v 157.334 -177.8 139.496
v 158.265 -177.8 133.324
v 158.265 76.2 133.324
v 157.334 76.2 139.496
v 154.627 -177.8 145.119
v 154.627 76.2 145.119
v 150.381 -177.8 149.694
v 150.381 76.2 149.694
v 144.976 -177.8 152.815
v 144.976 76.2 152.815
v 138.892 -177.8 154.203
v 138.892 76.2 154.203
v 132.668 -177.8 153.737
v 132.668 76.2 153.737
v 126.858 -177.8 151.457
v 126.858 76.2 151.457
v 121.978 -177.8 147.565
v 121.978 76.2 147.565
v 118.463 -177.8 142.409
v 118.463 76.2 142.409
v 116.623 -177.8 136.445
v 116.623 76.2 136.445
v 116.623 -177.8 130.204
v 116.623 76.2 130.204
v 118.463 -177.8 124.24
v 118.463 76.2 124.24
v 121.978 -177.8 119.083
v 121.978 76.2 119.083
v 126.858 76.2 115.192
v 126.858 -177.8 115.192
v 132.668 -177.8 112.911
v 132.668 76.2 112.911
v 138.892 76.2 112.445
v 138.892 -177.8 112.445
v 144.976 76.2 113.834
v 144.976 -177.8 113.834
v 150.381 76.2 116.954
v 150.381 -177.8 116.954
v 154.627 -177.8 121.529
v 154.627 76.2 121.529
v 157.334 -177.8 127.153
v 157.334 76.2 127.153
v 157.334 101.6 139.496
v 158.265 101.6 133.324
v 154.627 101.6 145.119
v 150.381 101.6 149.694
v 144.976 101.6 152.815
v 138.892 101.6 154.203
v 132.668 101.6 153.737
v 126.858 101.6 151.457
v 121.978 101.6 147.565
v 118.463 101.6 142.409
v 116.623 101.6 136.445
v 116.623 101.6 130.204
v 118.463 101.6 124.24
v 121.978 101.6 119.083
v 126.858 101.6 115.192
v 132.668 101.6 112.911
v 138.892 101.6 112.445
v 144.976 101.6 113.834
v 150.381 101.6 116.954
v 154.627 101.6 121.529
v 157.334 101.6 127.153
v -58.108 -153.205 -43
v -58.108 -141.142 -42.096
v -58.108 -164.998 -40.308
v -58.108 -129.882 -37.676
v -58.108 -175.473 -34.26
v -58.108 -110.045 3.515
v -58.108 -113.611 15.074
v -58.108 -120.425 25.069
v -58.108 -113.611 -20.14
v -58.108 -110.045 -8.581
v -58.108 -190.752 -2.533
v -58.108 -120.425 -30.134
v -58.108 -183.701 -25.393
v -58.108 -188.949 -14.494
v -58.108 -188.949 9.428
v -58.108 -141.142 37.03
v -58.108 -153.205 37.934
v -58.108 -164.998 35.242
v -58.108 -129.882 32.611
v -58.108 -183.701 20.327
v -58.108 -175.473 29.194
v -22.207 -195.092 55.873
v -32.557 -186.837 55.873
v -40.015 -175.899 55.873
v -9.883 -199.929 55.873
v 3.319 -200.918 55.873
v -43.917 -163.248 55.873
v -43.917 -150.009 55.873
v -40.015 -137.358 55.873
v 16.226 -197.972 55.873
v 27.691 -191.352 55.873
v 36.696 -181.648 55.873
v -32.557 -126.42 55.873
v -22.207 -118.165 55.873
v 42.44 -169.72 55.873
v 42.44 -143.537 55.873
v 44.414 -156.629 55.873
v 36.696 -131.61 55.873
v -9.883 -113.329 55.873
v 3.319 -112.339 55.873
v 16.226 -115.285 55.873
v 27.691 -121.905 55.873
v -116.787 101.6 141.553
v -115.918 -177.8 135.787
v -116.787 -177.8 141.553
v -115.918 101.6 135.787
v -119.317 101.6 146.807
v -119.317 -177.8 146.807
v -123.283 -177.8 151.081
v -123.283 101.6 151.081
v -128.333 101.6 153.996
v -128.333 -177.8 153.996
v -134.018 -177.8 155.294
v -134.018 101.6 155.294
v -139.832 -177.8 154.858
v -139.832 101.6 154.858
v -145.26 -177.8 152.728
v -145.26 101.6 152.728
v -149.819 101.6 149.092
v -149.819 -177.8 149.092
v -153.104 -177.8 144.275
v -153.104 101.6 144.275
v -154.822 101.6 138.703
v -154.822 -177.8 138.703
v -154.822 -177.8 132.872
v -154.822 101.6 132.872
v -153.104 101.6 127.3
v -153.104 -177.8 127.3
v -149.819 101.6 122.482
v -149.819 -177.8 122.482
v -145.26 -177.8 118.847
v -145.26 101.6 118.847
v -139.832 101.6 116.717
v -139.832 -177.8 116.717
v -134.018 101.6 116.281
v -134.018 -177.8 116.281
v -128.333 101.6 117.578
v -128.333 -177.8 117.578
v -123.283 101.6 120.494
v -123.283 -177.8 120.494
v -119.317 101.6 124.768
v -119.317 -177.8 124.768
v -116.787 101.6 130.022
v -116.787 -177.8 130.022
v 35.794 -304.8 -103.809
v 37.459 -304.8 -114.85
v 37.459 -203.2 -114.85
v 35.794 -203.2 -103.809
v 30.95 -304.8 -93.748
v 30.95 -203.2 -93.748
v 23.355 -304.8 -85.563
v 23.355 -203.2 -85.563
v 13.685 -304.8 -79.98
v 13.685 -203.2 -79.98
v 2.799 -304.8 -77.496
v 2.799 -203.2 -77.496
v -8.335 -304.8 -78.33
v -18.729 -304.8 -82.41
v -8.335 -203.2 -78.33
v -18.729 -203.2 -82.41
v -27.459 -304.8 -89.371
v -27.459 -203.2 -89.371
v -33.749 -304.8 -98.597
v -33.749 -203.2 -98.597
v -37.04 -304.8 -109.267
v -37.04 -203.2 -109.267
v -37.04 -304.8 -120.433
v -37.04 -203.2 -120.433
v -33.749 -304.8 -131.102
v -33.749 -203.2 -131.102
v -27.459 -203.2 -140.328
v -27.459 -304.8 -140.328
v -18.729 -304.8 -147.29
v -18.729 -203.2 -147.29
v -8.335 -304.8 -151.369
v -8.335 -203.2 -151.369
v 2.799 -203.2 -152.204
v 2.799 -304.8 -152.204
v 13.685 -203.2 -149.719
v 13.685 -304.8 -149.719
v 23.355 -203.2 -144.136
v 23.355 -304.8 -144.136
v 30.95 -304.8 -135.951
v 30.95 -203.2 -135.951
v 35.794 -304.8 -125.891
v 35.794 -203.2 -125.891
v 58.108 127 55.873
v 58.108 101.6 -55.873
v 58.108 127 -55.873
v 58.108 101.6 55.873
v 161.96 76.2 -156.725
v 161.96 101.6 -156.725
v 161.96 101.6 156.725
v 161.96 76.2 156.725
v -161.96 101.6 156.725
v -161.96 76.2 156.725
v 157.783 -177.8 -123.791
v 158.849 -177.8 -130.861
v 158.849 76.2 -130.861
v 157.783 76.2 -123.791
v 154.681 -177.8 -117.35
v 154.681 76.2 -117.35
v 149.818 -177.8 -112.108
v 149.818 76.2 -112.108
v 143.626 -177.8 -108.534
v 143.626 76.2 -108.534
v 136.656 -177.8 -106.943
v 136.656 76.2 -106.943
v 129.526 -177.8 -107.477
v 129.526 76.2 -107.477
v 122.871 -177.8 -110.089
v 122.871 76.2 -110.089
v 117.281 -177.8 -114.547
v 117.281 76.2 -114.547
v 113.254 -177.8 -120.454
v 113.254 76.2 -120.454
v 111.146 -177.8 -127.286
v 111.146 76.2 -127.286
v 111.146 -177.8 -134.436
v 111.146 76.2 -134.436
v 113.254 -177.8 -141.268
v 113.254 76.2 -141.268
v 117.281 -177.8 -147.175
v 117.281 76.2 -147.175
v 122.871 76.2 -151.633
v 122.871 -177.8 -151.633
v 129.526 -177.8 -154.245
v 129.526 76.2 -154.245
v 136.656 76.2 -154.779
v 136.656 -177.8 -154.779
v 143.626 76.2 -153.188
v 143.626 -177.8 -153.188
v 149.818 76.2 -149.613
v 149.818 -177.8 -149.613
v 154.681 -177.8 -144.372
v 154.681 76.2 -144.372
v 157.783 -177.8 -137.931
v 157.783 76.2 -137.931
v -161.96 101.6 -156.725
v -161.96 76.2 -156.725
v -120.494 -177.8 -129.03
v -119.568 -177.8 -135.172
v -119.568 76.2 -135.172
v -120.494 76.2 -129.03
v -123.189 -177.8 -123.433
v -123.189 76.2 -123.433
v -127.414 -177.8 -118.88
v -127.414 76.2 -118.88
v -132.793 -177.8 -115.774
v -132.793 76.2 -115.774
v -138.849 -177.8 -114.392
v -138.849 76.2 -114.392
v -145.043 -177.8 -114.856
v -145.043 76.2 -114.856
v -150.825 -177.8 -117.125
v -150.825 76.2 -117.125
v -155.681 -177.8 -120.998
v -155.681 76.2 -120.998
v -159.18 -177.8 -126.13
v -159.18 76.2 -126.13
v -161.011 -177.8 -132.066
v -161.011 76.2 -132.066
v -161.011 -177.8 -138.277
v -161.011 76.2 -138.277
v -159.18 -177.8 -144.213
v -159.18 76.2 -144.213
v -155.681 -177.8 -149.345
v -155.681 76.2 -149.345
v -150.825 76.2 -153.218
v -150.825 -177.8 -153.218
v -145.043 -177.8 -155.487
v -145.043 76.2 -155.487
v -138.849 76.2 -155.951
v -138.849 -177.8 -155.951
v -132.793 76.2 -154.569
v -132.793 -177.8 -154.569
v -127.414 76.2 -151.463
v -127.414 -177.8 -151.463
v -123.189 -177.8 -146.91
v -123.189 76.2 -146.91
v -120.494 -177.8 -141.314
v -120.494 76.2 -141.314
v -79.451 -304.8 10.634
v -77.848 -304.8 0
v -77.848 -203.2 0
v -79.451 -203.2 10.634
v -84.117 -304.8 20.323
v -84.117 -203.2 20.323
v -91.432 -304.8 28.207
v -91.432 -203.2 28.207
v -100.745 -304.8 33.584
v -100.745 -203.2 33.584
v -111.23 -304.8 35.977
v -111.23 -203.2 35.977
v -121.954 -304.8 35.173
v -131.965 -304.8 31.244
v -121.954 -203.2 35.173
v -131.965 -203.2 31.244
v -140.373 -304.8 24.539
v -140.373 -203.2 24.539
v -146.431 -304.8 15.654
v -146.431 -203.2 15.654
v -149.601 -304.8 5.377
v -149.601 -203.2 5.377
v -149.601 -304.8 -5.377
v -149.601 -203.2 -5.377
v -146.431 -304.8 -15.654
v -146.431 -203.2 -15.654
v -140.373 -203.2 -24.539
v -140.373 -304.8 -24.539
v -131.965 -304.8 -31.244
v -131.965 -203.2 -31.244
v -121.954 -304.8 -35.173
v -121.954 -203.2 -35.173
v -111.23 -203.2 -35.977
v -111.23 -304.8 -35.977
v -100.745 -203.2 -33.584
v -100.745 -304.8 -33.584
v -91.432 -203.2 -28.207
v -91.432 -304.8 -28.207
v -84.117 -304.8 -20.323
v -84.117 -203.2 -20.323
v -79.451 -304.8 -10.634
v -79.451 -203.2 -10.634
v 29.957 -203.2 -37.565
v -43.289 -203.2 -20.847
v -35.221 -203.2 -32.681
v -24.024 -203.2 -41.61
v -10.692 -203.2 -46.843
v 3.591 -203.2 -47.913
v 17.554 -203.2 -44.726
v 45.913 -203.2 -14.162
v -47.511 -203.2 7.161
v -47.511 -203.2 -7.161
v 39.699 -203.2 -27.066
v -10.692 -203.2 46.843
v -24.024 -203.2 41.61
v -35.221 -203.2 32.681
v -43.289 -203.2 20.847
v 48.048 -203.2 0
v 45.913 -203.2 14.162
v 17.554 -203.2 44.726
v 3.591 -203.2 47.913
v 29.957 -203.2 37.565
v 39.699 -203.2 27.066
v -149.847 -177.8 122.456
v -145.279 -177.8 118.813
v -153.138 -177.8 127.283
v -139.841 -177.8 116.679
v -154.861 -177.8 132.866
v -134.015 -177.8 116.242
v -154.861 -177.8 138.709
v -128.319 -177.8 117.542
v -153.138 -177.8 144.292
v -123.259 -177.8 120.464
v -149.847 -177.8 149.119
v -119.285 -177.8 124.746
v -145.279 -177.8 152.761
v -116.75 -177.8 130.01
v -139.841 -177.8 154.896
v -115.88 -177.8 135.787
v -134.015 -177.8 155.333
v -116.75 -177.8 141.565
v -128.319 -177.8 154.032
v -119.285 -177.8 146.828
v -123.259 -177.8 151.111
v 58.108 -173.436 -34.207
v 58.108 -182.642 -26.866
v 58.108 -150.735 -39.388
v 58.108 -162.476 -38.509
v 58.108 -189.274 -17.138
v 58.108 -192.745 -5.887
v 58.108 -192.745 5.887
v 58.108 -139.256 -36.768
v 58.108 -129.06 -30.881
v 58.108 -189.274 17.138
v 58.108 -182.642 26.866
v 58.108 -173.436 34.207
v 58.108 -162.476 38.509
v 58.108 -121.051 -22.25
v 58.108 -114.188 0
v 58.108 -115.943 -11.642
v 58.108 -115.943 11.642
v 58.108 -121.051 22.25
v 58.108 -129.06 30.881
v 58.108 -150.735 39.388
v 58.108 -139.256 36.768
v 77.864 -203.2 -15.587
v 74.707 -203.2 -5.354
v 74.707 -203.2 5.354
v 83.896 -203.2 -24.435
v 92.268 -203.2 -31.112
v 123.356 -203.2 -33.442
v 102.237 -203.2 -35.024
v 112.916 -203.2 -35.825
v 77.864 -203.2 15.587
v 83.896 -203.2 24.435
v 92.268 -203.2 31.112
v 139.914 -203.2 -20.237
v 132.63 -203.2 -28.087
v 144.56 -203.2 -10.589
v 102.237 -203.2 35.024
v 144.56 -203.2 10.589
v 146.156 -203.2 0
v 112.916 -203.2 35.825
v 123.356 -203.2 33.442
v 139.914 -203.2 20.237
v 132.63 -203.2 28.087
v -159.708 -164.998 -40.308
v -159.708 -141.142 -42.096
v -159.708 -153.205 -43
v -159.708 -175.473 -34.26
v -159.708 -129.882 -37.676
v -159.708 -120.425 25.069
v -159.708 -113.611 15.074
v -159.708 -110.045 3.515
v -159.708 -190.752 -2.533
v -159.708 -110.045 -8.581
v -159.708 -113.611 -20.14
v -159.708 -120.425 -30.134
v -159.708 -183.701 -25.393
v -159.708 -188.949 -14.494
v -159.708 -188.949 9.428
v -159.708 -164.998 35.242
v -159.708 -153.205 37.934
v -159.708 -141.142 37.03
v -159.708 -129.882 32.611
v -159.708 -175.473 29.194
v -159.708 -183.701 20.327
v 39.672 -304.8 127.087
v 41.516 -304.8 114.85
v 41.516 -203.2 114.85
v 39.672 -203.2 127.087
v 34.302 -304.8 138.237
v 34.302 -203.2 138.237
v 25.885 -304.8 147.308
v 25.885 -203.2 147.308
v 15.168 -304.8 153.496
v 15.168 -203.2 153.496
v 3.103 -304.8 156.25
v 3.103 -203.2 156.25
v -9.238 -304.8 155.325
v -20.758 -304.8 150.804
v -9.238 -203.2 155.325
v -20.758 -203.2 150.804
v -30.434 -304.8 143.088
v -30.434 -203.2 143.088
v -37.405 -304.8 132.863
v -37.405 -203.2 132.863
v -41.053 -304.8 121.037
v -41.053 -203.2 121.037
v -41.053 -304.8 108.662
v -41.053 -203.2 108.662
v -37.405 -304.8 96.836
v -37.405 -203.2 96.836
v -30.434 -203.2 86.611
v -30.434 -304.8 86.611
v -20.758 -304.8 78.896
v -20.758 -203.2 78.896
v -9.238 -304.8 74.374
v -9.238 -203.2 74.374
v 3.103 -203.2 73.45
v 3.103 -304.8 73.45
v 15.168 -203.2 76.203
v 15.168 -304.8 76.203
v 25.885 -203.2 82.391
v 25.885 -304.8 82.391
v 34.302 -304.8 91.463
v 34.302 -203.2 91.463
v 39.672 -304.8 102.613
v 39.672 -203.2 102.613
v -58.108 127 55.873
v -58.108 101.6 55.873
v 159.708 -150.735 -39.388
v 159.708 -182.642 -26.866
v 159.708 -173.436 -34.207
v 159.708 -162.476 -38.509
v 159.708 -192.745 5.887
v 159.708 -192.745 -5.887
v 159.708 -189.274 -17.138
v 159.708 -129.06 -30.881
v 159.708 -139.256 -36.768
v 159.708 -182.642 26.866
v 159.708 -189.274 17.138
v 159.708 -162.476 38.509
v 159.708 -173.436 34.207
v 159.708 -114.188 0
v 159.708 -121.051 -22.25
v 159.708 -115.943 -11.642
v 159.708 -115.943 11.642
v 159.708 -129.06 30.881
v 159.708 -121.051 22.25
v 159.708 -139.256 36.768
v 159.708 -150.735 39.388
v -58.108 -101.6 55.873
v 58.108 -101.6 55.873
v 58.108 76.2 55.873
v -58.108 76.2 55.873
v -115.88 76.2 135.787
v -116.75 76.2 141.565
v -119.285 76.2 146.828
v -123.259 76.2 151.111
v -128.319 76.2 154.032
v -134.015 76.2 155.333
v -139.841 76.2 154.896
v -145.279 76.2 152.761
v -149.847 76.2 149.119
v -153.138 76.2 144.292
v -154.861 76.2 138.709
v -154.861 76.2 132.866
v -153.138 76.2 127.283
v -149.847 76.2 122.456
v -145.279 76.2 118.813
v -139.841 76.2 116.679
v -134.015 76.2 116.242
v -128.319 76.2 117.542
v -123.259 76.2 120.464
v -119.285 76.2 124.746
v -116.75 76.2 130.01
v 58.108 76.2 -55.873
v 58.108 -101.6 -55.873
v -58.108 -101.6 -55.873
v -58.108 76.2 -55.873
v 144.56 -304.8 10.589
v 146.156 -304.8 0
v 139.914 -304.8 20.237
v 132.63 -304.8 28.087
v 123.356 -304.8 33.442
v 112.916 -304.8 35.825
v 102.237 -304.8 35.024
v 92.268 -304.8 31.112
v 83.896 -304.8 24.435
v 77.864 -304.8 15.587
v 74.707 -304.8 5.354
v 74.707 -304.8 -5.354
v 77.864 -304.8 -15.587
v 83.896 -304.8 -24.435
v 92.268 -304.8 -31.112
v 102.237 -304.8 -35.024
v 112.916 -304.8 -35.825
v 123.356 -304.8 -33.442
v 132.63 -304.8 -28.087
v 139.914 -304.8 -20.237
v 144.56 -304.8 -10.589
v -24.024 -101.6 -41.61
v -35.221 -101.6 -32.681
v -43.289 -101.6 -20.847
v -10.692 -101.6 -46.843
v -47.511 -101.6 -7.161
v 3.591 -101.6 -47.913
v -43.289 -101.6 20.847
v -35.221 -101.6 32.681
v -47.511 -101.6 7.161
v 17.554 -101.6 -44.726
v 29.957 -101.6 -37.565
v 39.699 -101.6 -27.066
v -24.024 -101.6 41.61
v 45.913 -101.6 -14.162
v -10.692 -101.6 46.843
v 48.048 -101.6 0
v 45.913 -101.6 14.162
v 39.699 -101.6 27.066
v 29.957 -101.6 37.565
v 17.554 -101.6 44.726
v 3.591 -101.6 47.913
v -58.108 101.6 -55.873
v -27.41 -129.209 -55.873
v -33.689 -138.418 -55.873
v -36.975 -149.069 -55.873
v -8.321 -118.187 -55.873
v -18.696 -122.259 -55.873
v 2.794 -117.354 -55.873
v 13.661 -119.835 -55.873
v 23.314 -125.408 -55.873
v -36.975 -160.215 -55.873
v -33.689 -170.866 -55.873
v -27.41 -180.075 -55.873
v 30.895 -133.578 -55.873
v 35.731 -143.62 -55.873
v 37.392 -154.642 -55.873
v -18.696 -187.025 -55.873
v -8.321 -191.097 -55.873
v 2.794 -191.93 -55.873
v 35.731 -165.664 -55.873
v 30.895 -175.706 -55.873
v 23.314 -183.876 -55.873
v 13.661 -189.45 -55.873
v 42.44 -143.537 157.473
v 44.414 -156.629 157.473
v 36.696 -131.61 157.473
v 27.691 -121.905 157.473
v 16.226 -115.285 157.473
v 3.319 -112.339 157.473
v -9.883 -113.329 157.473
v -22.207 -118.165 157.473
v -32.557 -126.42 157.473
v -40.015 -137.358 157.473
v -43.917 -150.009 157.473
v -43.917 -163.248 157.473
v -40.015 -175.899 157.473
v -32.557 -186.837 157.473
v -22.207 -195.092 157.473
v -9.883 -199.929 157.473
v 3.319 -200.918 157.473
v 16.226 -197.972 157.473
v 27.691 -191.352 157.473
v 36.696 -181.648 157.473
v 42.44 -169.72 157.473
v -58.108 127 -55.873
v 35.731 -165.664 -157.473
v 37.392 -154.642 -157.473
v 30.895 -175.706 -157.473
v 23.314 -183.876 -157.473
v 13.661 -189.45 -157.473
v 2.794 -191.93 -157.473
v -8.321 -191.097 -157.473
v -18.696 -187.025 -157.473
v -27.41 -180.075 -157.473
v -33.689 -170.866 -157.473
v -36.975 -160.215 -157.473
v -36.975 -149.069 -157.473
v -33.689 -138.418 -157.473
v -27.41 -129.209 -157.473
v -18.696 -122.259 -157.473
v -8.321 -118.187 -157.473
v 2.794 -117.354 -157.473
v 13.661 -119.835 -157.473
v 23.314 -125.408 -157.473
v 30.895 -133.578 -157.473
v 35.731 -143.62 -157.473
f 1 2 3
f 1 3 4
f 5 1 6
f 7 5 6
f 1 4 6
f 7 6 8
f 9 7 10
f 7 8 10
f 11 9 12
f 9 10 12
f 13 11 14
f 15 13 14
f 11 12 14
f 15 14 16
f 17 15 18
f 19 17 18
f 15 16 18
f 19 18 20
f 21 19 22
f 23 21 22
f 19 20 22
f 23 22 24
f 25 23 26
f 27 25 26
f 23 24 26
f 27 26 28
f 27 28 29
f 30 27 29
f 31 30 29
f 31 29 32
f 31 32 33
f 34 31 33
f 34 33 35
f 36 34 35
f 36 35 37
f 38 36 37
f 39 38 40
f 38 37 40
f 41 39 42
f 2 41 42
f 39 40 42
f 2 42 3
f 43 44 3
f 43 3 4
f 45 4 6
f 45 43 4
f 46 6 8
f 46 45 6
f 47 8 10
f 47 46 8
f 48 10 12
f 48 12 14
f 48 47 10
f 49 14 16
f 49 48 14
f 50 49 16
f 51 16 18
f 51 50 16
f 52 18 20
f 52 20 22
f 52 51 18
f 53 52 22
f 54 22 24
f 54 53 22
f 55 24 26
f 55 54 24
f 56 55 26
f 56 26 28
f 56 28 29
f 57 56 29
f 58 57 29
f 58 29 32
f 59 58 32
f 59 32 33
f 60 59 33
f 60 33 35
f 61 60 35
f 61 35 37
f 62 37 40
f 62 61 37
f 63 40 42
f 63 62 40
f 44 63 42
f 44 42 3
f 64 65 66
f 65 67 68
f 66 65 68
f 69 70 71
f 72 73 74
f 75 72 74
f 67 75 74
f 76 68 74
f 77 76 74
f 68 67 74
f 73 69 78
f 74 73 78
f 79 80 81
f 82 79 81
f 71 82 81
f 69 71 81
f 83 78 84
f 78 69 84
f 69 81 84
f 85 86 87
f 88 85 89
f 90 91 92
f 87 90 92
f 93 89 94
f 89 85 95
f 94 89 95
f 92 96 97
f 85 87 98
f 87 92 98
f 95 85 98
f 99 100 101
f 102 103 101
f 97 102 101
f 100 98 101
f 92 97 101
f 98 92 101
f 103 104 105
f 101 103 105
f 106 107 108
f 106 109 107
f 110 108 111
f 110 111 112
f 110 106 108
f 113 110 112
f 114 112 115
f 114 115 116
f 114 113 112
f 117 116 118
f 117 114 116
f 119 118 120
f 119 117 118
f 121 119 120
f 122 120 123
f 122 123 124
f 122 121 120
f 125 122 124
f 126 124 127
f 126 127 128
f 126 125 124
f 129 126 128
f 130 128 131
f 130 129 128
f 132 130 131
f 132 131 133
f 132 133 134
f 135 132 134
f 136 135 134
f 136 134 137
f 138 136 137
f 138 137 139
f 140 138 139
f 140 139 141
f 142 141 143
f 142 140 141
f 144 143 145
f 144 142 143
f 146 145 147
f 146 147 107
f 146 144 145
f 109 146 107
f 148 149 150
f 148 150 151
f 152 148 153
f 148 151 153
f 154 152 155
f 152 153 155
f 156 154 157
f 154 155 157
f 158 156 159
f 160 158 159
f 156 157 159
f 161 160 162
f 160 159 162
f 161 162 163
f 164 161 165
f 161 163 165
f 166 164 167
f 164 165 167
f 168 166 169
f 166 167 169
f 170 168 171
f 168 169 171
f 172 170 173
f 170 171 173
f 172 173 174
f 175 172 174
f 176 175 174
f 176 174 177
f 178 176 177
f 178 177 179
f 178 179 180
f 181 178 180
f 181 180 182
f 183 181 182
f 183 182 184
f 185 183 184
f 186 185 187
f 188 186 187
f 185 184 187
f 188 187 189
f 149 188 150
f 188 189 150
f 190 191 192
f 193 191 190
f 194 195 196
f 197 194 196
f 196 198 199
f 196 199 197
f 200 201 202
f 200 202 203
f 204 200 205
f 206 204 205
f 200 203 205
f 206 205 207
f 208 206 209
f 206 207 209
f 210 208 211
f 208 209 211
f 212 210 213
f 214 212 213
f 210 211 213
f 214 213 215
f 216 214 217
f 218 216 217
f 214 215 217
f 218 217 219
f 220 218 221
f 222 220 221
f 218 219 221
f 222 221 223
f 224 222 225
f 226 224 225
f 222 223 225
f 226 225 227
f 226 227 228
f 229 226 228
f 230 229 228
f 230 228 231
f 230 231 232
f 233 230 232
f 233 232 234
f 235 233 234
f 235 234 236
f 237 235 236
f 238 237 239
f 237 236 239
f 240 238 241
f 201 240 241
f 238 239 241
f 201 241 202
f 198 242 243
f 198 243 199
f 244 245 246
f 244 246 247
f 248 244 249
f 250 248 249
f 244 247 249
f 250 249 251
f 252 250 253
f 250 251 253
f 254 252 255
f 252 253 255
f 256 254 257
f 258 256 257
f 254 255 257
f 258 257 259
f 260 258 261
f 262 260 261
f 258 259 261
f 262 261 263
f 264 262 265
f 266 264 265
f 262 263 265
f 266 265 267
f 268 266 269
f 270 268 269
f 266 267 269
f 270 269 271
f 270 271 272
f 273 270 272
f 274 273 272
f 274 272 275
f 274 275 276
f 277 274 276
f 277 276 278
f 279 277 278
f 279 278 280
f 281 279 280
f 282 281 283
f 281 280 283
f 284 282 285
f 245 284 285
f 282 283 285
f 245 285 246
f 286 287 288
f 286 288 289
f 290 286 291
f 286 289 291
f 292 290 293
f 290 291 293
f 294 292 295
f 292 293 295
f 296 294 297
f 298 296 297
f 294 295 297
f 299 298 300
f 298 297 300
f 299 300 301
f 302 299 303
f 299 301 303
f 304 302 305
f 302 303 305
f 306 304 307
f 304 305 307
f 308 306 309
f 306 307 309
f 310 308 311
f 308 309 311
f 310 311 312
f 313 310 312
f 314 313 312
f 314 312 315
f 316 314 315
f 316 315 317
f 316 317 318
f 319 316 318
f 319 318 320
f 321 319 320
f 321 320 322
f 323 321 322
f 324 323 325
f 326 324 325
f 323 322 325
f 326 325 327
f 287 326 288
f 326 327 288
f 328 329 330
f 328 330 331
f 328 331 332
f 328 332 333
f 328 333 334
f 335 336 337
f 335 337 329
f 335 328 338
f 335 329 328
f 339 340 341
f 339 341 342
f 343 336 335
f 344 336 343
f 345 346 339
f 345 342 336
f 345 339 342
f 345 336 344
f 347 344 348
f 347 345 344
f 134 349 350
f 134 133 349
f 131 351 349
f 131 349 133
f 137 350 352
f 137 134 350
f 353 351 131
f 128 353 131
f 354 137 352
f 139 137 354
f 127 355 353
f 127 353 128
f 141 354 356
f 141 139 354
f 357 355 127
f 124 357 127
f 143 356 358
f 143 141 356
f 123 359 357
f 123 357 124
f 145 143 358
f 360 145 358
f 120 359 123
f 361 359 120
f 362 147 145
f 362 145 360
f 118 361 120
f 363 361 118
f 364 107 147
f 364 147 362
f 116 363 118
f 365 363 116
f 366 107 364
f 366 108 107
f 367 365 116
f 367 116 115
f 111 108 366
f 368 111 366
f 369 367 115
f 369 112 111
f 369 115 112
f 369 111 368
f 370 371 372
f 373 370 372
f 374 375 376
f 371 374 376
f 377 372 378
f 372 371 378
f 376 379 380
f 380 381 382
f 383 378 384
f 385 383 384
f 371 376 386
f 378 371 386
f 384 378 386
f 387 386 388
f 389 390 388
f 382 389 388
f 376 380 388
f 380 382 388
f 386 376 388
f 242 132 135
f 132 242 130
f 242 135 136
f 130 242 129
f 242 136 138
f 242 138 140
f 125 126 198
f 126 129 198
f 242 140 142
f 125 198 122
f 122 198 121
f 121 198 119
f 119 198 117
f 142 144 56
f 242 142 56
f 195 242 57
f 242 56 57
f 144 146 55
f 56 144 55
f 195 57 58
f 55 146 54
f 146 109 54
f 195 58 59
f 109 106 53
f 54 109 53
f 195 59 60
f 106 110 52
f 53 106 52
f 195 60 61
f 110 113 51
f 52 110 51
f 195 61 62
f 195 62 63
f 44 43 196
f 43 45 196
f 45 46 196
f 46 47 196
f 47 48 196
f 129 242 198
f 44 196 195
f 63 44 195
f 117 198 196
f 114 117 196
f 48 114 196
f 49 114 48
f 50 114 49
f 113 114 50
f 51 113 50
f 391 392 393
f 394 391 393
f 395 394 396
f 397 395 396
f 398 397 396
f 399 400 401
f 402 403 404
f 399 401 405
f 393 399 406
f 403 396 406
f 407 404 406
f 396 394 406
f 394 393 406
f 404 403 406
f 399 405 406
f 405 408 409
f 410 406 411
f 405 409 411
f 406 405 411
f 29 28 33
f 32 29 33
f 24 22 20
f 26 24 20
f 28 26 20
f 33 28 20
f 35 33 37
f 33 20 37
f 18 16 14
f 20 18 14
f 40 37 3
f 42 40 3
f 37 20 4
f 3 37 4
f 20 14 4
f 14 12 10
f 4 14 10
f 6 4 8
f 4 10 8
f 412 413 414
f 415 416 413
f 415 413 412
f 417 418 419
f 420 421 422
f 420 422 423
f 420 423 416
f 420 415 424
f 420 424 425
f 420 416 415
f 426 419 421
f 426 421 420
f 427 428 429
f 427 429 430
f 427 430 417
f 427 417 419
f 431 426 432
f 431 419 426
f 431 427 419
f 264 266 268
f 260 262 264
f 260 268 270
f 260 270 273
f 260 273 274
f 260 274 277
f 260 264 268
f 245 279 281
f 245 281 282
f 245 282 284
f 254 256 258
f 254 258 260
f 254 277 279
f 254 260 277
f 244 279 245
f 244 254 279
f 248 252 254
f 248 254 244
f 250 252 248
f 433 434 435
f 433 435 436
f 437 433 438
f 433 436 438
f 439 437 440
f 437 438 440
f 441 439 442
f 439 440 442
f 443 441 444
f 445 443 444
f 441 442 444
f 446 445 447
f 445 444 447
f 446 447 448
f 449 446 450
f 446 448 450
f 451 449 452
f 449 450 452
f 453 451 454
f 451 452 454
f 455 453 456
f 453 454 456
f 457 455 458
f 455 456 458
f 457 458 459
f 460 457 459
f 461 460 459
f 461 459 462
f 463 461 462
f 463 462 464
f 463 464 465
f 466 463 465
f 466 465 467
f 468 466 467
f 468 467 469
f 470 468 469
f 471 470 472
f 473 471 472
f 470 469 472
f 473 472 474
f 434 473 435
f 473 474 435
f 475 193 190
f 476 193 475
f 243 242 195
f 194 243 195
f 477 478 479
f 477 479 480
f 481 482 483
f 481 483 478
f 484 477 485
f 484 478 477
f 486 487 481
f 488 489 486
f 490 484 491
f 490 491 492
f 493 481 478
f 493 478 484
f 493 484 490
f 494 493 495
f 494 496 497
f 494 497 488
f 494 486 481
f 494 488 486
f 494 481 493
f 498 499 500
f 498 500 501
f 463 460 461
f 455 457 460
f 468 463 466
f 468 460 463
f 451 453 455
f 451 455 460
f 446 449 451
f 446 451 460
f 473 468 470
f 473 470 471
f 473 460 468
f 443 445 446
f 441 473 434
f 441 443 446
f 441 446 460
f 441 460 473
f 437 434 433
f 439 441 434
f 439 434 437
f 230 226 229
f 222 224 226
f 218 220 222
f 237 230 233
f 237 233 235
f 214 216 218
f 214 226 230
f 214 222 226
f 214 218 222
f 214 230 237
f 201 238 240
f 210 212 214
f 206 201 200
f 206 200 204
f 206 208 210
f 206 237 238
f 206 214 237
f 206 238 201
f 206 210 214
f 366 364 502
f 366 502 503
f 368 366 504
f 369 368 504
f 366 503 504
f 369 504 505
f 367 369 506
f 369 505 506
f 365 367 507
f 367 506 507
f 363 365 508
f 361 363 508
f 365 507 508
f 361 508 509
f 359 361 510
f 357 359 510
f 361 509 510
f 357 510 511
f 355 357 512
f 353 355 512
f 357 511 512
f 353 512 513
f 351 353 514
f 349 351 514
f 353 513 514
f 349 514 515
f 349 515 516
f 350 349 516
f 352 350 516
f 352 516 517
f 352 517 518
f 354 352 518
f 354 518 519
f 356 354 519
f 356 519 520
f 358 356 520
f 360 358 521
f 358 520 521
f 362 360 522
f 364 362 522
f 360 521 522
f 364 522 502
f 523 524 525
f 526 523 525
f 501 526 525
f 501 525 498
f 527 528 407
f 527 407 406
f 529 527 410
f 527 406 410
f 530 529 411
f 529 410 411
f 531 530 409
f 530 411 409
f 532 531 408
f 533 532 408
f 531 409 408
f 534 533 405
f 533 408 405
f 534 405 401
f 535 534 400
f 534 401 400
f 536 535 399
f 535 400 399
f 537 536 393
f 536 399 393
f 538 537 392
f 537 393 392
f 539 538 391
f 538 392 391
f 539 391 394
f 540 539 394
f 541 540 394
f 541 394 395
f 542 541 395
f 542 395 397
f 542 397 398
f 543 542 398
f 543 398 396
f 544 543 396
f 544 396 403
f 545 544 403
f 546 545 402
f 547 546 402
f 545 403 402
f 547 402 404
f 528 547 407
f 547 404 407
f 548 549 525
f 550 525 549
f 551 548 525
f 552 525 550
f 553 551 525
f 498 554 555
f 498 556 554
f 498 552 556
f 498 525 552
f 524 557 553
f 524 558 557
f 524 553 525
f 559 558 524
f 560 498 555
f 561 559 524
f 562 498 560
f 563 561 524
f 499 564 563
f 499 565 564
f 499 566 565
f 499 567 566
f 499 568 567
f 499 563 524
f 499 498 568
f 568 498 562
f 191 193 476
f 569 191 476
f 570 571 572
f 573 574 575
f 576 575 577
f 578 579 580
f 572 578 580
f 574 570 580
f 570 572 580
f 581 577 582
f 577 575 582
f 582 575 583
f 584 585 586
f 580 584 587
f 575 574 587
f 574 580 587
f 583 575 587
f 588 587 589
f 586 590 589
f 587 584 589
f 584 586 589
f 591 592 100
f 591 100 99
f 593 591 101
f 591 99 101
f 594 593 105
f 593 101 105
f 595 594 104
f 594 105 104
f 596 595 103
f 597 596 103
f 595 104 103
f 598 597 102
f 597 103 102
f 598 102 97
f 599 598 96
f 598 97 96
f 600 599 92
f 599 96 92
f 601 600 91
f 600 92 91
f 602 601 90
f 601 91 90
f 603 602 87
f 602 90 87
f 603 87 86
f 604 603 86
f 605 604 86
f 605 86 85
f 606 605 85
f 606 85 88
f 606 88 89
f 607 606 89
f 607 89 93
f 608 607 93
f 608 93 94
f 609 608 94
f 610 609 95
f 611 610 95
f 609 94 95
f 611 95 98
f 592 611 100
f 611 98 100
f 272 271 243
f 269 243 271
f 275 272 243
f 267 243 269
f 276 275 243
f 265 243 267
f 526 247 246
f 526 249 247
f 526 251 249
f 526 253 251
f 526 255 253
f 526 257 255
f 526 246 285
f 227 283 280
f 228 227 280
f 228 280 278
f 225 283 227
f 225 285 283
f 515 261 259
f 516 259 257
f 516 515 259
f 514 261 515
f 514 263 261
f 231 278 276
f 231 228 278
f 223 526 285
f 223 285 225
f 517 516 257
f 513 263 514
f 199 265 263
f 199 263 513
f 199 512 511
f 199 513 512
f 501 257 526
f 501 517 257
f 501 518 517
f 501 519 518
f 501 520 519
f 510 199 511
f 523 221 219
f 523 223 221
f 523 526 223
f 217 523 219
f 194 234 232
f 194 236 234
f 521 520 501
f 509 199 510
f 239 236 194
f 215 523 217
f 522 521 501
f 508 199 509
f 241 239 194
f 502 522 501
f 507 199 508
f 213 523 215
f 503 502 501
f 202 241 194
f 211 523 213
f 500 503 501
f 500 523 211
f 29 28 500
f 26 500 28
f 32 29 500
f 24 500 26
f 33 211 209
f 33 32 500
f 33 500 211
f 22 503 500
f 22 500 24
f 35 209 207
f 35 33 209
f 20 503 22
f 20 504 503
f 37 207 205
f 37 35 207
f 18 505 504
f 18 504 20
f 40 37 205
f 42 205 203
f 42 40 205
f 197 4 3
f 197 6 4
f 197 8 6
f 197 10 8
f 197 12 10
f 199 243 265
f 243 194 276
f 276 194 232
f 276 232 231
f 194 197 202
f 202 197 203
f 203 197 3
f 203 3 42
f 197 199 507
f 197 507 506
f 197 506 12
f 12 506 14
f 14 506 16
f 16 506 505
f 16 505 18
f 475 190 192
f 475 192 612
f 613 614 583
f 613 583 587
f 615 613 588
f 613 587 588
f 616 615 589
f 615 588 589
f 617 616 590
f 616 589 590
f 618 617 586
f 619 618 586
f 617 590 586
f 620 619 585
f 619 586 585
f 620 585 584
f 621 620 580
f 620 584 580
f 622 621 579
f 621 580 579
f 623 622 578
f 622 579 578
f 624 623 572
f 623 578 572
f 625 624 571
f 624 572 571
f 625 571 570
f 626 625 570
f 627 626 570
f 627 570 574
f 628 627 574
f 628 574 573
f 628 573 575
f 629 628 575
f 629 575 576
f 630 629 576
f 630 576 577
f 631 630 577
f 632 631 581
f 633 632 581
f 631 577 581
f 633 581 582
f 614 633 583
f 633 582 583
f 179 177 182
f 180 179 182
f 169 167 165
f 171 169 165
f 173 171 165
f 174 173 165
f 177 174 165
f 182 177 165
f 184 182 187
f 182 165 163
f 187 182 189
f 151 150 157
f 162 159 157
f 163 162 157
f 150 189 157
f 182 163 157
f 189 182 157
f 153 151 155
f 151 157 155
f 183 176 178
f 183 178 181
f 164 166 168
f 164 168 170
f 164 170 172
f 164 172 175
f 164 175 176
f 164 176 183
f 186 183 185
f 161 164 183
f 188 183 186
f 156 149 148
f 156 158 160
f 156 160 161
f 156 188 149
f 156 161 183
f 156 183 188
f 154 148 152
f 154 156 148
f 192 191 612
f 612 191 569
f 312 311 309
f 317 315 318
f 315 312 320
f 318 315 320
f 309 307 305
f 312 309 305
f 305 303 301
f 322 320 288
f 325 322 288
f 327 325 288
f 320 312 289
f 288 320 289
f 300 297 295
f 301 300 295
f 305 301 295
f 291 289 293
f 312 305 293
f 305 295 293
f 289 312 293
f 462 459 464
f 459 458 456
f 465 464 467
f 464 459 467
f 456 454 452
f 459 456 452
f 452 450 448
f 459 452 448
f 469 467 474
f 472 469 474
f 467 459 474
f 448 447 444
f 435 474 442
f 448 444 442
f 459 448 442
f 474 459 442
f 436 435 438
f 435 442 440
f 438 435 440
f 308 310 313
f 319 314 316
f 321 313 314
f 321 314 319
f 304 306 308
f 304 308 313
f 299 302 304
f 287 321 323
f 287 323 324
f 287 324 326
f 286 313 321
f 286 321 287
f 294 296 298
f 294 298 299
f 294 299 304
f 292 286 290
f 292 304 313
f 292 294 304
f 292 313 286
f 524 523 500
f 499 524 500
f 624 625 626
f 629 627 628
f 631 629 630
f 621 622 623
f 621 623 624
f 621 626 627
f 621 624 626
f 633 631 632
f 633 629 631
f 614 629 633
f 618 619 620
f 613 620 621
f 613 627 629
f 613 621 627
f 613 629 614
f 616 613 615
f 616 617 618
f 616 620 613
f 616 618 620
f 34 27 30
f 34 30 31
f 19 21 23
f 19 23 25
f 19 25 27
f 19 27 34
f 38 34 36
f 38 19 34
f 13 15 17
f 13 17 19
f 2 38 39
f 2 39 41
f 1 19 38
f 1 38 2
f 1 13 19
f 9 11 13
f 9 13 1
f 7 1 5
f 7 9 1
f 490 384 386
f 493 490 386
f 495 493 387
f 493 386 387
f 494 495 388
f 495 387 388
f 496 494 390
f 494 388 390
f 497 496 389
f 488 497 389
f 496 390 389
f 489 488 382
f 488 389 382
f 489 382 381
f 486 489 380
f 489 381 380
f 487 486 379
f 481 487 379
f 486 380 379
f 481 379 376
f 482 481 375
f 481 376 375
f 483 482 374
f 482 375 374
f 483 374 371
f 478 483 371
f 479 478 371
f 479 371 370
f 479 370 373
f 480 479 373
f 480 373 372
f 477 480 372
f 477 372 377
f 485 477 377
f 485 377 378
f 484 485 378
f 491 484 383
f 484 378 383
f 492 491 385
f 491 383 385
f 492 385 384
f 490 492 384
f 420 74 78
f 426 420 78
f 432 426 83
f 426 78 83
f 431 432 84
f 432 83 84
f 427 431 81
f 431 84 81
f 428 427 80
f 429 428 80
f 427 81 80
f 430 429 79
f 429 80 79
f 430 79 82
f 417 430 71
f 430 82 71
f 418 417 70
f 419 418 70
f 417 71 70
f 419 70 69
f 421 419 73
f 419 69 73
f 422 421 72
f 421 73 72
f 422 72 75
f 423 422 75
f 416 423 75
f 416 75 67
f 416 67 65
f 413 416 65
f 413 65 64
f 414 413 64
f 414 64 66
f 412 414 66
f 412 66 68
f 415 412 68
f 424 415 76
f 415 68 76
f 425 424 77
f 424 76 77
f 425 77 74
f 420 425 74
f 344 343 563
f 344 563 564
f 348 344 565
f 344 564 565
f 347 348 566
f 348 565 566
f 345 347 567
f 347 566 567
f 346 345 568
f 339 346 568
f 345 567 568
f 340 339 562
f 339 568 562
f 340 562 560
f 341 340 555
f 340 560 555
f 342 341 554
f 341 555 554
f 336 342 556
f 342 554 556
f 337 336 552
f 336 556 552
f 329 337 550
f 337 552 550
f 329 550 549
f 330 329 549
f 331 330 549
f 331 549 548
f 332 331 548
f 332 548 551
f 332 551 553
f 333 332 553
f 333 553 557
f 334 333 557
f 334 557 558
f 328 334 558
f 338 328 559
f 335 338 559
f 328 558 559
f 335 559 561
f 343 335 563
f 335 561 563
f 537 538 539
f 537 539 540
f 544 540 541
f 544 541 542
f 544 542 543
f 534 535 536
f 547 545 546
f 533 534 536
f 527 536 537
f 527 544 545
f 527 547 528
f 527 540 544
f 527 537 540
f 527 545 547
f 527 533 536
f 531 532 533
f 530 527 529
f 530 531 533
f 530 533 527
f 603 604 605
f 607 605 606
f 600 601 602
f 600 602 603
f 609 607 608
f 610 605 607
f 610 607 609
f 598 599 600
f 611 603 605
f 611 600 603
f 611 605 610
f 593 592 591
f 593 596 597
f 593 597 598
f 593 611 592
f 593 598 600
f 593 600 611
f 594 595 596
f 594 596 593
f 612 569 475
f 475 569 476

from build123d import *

# Parameters (mm, degrees)
F0_W      = 117.4075901508
F0_H      = 118.3015704155
F1_DEPTH  = 50.8
F2_R      = 46.9095853599
F3_DEPTH  = 50.8
F4_R      = 42.2632293301
F5_DEPTH  = 50.8
F7_W      = 54.8299401999
F7_H      = 113.5337427258
F8_DEPTH  = 50.8
F9_W      = 50.8
F9_H      = 113.5337427258
F10_DEPTH = 25.4
F12_W     = 116.2156388164
F12_H     = 111.7458119988
F14_DEPTH = 101.6
F13_R     = 40.0617685755
F15_DEPTH = 25.4
F16_R     = 48.047636449
F17_DEPTH = 101.6
F18_R     = 40.5801251775
F19_DEPTH = 101.6
F20_R     = 44.4135078244
F21_DEPTH = 101.6
F22_R     = 39.4988279677
F23_DEPTH = 101.6
F24_R     = 37.3922925892
F25_DEPTH = 101.6
F26_W     = 116.2156388164
F26_H     = 111.7458119988
F27_DEPTH = 101.6
F28_R     = 41.516224002
F29_DEPTH = 101.6
F30_R     = 36.077822792
F31_DEPTH = 101.6
F32_R     = 35.9250910759
F33_DEPTH = 101.6
F34_R     = 37.458616669
F35_DEPTH = 101.6
F36_W     = 323.9191174507
F36_H     = 313.4502470493
F36_W_2   = 116.2156388164
F36_H_2   = 111.7458119988
F37_DEPTH = 25.4
F38_W     = 116.2156388164
F38_H     = 111.7458119988
F39_DEPTH = 25.4
F40_R     = 19.5612370556
F41_DEPTH = 254
F42_W     = 323.9191174507
F42_H     = 313.4502470493
F42_W_2   = 116.2156388164
F42_H_2   = 111.7458119988
F42_R     = 19.5612370556
F42_R_2   = 20.9377364201
F44_DEPTH = 25.4
F45_R     = 19.599971861
F45_R_2   = 19.5612370556
F46_DEPTH = 254
F47_R     = 20.9377364201
F48_DEPTH = 254
F49_R     = 20.8378932338
F50_DEPTH = 254
F51_R     = 23.9852216025
F52_DEPTH = 254


with BuildPart() as f1:
    # F0 (on Front) → F1 (new body)
    with BuildSketch(Plane.XZ):
        Rectangle(F0_W, F0_H)
    extrude(amount=F1_DEPTH)

    # F2 (on face) → F3 (join)
    with BuildSketch(Plane(origin=(0, 0, 0), x_dir=(-1, 0, 0), z_dir=(0, 1, 0))):
        Circle(F2_R)
    extrude(amount=-F3_DEPTH)

    # F4 (on face) → F5 (join)
    with BuildSketch(Plane.XZ.offset(50.8)):
        Circle(F4_R)
    extrude(amount=F5_DEPTH)


with BuildPart() as f8:
    # F7 (on Front) → F8 (new body)
    with BuildSketch(Plane.XZ):
        Rectangle(F7_W, F7_H)
    extrude(amount=F8_DEPTH)

    # F9 (on face) → F10 (join)
    with BuildSketch(Plane.YZ.offset(27.4149700999)):
        with Locations((-25.4, 0)):
            Rectangle(F9_W, F9_H)
    extrude(amount=F10_DEPTH)


with BuildPart() as f14:
    # F12 (on Front) → F14 (new body)
    with BuildSketch(Plane.XZ):
        Rectangle(F12_W, F12_H)
    extrude(amount=F14_DEPTH)

    # F13 (on face) → F15 (join)
    with BuildSketch(Plane.XZ):
        Circle(F13_R)
    extrude(amount=F15_DEPTH)

    # F16 (on face) → F17 (join)
    with BuildSketch(Plane.XZ.offset(101.6)):
        Circle(F16_R)
    extrude(amount=F17_DEPTH)

    # F26 (on face) → F27 (join)
    with BuildSketch(Plane(origin=(0, 0, 0), x_dir=(-1, 0, 0), z_dir=(0, 1, 0))):
        Rectangle(F26_W, F26_H)
    extrude(amount=F27_DEPTH)

    # F42 (on face) → F44 (join)
    with BuildSketch(Plane.XZ.offset(-101.6)):
        Rectangle(F42_W, F42_H)
        Rectangle(F42_W_2, F42_H_2, mode=Mode.SUBTRACT)
        with Locations((-135.4794800282, 135.7873976231)):
            Circle(F42_R, mode=Mode.SUBTRACT)
        with Locations((137.3269408941, 133.3241313696)):
            Circle(F42_R_2, mode=Mode.SUBTRACT)
    extrude(amount=F44_DEPTH)

    # F45 (on face) → F46 (join)
    with BuildSketch(Plane.XZ.offset(-76.2)):
        with Locations((-135.4794800282, 135.7873976231)):
            Circle(F45_R)
        with Locations((-135.4794800282, 135.7873976231)):
            Circle(F45_R_2, mode=Mode.SUBTRACT)
    extrude(amount=F46_DEPTH)

    # F49 (on face) → F50 (join)
    with BuildSketch(Plane.XZ.offset(-76.2)):
        with Locations((-140.4060125351, -135.1715773344)):
            Circle(F49_R)
    extrude(amount=F50_DEPTH)

    # F51 (on face) → F52 (join)
    with BuildSketch(Plane.XZ.offset(-76.2)):
        with Locations((134.8636746407, -130.8608651161)):
            Circle(F51_R)
    extrude(amount=F52_DEPTH)


with BuildPart() as f19:
    # F18 (on face) → F19 (new body)
    with BuildSketch(Plane(origin=(-58.1078194082, 0, 0), x_dir=(0, -1, 0), z_dir=(-1, 0, 0))):
        with Locations((150.1721739769, -2.5329052005)):
            Circle(F18_R)
    extrude(amount=F19_DEPTH)


with BuildPart() as f21:
    # F20 (on face) → F21 (new body)
    with BuildSketch(Plane.XY.offset(55.8729059994)):
        with Locations((0, -156.6285938025)):
            Circle(F20_R)
    extrude(amount=F21_DEPTH)


with BuildPart() as f23:
    # F22 (on face) → F23 (new body)
    with BuildSketch(Plane.YZ.offset(58.1078194082)):
        with Locations((-153.6868661642, 0)):
            Circle(F22_R)
    extrude(amount=F23_DEPTH)


with BuildPart() as f25:
    # F24 (on face) → F25 (new body)
    with BuildSketch(Plane(origin=(0, 0, -55.8729059994), x_dir=(1, 0, 0), z_dir=(0, 0, -1))):
        with Locations((0, 154.6420156956)):
            Circle(F24_R)
    extrude(amount=F25_DEPTH)


with BuildPart() as f29:
    # F28 (on face) → F29 (new body)
    with BuildSketch(Plane.XZ.offset(203.2)):
        with Locations((0, 114.8496568203)):
            Circle(F28_R)
    extrude(amount=F29_DEPTH)


with BuildPart() as f31:
    # F30 (on face) → F31 (new body)
    with BuildSketch(Plane.XZ.offset(203.2)):
        with Locations((-113.9259338379, 0)):
            Circle(F30_R)
    extrude(amount=F31_DEPTH)


with BuildPart() as f33:
    # F32 (on face) → F33 (new body)
    with BuildSketch(Plane.XZ.offset(203.2)):
        with Locations((110.2310344577, 0)):
            Circle(F32_R)
    extrude(amount=F33_DEPTH)


with BuildPart() as f35:
    # F34 (on face) → F35 (new body)
    with BuildSketch(Plane.XZ.offset(203.2)):
        with Locations((0, -114.8496568203)):
            Circle(F34_R)
    extrude(amount=F35_DEPTH)


with BuildPart() as f37:
    # F36 (on face) → F37 (new body)
    with BuildSketch(Plane(origin=(0, 101.6, 0), x_dir=(-1, 0, 0), z_dir=(0, 1, 0))):
        Rectangle(F36_W, F36_H)
        Rectangle(F36_W_2, F36_H_2, mode=Mode.SUBTRACT)
    extrude(amount=F37_DEPTH)

    # F40 (on face) → F41 (join)
    with BuildSketch(Plane.XZ.offset(-101.6)):
        with Locations((-135.4794800282, 135.7873976231)):
            Circle(F40_R)
    extrude(amount=F41_DEPTH)


with BuildPart() as f39:
    # F38 (on face) → F39 (new body)
    with BuildSketch(Plane(origin=(0, 101.6, 0), x_dir=(-1, 0, 0), z_dir=(0, 1, 0))):
        Rectangle(F38_W, F38_H)
    extrude(amount=F39_DEPTH)


with BuildPart() as f48:
    # F47 (on face) → F48 (new body)
    with BuildSketch(Plane.XZ.offset(-76.2)):
        with Locations((137.3269408941, 133.3241313696)):
            Circle(F47_R)
    extrude(amount=F48_DEPTH)


solid = Compound([f14.part, f19.part, f21.part, f23.part, f25.part, f29.part, f31.part, f33.part, f35.part, f39.part, f48.part])
